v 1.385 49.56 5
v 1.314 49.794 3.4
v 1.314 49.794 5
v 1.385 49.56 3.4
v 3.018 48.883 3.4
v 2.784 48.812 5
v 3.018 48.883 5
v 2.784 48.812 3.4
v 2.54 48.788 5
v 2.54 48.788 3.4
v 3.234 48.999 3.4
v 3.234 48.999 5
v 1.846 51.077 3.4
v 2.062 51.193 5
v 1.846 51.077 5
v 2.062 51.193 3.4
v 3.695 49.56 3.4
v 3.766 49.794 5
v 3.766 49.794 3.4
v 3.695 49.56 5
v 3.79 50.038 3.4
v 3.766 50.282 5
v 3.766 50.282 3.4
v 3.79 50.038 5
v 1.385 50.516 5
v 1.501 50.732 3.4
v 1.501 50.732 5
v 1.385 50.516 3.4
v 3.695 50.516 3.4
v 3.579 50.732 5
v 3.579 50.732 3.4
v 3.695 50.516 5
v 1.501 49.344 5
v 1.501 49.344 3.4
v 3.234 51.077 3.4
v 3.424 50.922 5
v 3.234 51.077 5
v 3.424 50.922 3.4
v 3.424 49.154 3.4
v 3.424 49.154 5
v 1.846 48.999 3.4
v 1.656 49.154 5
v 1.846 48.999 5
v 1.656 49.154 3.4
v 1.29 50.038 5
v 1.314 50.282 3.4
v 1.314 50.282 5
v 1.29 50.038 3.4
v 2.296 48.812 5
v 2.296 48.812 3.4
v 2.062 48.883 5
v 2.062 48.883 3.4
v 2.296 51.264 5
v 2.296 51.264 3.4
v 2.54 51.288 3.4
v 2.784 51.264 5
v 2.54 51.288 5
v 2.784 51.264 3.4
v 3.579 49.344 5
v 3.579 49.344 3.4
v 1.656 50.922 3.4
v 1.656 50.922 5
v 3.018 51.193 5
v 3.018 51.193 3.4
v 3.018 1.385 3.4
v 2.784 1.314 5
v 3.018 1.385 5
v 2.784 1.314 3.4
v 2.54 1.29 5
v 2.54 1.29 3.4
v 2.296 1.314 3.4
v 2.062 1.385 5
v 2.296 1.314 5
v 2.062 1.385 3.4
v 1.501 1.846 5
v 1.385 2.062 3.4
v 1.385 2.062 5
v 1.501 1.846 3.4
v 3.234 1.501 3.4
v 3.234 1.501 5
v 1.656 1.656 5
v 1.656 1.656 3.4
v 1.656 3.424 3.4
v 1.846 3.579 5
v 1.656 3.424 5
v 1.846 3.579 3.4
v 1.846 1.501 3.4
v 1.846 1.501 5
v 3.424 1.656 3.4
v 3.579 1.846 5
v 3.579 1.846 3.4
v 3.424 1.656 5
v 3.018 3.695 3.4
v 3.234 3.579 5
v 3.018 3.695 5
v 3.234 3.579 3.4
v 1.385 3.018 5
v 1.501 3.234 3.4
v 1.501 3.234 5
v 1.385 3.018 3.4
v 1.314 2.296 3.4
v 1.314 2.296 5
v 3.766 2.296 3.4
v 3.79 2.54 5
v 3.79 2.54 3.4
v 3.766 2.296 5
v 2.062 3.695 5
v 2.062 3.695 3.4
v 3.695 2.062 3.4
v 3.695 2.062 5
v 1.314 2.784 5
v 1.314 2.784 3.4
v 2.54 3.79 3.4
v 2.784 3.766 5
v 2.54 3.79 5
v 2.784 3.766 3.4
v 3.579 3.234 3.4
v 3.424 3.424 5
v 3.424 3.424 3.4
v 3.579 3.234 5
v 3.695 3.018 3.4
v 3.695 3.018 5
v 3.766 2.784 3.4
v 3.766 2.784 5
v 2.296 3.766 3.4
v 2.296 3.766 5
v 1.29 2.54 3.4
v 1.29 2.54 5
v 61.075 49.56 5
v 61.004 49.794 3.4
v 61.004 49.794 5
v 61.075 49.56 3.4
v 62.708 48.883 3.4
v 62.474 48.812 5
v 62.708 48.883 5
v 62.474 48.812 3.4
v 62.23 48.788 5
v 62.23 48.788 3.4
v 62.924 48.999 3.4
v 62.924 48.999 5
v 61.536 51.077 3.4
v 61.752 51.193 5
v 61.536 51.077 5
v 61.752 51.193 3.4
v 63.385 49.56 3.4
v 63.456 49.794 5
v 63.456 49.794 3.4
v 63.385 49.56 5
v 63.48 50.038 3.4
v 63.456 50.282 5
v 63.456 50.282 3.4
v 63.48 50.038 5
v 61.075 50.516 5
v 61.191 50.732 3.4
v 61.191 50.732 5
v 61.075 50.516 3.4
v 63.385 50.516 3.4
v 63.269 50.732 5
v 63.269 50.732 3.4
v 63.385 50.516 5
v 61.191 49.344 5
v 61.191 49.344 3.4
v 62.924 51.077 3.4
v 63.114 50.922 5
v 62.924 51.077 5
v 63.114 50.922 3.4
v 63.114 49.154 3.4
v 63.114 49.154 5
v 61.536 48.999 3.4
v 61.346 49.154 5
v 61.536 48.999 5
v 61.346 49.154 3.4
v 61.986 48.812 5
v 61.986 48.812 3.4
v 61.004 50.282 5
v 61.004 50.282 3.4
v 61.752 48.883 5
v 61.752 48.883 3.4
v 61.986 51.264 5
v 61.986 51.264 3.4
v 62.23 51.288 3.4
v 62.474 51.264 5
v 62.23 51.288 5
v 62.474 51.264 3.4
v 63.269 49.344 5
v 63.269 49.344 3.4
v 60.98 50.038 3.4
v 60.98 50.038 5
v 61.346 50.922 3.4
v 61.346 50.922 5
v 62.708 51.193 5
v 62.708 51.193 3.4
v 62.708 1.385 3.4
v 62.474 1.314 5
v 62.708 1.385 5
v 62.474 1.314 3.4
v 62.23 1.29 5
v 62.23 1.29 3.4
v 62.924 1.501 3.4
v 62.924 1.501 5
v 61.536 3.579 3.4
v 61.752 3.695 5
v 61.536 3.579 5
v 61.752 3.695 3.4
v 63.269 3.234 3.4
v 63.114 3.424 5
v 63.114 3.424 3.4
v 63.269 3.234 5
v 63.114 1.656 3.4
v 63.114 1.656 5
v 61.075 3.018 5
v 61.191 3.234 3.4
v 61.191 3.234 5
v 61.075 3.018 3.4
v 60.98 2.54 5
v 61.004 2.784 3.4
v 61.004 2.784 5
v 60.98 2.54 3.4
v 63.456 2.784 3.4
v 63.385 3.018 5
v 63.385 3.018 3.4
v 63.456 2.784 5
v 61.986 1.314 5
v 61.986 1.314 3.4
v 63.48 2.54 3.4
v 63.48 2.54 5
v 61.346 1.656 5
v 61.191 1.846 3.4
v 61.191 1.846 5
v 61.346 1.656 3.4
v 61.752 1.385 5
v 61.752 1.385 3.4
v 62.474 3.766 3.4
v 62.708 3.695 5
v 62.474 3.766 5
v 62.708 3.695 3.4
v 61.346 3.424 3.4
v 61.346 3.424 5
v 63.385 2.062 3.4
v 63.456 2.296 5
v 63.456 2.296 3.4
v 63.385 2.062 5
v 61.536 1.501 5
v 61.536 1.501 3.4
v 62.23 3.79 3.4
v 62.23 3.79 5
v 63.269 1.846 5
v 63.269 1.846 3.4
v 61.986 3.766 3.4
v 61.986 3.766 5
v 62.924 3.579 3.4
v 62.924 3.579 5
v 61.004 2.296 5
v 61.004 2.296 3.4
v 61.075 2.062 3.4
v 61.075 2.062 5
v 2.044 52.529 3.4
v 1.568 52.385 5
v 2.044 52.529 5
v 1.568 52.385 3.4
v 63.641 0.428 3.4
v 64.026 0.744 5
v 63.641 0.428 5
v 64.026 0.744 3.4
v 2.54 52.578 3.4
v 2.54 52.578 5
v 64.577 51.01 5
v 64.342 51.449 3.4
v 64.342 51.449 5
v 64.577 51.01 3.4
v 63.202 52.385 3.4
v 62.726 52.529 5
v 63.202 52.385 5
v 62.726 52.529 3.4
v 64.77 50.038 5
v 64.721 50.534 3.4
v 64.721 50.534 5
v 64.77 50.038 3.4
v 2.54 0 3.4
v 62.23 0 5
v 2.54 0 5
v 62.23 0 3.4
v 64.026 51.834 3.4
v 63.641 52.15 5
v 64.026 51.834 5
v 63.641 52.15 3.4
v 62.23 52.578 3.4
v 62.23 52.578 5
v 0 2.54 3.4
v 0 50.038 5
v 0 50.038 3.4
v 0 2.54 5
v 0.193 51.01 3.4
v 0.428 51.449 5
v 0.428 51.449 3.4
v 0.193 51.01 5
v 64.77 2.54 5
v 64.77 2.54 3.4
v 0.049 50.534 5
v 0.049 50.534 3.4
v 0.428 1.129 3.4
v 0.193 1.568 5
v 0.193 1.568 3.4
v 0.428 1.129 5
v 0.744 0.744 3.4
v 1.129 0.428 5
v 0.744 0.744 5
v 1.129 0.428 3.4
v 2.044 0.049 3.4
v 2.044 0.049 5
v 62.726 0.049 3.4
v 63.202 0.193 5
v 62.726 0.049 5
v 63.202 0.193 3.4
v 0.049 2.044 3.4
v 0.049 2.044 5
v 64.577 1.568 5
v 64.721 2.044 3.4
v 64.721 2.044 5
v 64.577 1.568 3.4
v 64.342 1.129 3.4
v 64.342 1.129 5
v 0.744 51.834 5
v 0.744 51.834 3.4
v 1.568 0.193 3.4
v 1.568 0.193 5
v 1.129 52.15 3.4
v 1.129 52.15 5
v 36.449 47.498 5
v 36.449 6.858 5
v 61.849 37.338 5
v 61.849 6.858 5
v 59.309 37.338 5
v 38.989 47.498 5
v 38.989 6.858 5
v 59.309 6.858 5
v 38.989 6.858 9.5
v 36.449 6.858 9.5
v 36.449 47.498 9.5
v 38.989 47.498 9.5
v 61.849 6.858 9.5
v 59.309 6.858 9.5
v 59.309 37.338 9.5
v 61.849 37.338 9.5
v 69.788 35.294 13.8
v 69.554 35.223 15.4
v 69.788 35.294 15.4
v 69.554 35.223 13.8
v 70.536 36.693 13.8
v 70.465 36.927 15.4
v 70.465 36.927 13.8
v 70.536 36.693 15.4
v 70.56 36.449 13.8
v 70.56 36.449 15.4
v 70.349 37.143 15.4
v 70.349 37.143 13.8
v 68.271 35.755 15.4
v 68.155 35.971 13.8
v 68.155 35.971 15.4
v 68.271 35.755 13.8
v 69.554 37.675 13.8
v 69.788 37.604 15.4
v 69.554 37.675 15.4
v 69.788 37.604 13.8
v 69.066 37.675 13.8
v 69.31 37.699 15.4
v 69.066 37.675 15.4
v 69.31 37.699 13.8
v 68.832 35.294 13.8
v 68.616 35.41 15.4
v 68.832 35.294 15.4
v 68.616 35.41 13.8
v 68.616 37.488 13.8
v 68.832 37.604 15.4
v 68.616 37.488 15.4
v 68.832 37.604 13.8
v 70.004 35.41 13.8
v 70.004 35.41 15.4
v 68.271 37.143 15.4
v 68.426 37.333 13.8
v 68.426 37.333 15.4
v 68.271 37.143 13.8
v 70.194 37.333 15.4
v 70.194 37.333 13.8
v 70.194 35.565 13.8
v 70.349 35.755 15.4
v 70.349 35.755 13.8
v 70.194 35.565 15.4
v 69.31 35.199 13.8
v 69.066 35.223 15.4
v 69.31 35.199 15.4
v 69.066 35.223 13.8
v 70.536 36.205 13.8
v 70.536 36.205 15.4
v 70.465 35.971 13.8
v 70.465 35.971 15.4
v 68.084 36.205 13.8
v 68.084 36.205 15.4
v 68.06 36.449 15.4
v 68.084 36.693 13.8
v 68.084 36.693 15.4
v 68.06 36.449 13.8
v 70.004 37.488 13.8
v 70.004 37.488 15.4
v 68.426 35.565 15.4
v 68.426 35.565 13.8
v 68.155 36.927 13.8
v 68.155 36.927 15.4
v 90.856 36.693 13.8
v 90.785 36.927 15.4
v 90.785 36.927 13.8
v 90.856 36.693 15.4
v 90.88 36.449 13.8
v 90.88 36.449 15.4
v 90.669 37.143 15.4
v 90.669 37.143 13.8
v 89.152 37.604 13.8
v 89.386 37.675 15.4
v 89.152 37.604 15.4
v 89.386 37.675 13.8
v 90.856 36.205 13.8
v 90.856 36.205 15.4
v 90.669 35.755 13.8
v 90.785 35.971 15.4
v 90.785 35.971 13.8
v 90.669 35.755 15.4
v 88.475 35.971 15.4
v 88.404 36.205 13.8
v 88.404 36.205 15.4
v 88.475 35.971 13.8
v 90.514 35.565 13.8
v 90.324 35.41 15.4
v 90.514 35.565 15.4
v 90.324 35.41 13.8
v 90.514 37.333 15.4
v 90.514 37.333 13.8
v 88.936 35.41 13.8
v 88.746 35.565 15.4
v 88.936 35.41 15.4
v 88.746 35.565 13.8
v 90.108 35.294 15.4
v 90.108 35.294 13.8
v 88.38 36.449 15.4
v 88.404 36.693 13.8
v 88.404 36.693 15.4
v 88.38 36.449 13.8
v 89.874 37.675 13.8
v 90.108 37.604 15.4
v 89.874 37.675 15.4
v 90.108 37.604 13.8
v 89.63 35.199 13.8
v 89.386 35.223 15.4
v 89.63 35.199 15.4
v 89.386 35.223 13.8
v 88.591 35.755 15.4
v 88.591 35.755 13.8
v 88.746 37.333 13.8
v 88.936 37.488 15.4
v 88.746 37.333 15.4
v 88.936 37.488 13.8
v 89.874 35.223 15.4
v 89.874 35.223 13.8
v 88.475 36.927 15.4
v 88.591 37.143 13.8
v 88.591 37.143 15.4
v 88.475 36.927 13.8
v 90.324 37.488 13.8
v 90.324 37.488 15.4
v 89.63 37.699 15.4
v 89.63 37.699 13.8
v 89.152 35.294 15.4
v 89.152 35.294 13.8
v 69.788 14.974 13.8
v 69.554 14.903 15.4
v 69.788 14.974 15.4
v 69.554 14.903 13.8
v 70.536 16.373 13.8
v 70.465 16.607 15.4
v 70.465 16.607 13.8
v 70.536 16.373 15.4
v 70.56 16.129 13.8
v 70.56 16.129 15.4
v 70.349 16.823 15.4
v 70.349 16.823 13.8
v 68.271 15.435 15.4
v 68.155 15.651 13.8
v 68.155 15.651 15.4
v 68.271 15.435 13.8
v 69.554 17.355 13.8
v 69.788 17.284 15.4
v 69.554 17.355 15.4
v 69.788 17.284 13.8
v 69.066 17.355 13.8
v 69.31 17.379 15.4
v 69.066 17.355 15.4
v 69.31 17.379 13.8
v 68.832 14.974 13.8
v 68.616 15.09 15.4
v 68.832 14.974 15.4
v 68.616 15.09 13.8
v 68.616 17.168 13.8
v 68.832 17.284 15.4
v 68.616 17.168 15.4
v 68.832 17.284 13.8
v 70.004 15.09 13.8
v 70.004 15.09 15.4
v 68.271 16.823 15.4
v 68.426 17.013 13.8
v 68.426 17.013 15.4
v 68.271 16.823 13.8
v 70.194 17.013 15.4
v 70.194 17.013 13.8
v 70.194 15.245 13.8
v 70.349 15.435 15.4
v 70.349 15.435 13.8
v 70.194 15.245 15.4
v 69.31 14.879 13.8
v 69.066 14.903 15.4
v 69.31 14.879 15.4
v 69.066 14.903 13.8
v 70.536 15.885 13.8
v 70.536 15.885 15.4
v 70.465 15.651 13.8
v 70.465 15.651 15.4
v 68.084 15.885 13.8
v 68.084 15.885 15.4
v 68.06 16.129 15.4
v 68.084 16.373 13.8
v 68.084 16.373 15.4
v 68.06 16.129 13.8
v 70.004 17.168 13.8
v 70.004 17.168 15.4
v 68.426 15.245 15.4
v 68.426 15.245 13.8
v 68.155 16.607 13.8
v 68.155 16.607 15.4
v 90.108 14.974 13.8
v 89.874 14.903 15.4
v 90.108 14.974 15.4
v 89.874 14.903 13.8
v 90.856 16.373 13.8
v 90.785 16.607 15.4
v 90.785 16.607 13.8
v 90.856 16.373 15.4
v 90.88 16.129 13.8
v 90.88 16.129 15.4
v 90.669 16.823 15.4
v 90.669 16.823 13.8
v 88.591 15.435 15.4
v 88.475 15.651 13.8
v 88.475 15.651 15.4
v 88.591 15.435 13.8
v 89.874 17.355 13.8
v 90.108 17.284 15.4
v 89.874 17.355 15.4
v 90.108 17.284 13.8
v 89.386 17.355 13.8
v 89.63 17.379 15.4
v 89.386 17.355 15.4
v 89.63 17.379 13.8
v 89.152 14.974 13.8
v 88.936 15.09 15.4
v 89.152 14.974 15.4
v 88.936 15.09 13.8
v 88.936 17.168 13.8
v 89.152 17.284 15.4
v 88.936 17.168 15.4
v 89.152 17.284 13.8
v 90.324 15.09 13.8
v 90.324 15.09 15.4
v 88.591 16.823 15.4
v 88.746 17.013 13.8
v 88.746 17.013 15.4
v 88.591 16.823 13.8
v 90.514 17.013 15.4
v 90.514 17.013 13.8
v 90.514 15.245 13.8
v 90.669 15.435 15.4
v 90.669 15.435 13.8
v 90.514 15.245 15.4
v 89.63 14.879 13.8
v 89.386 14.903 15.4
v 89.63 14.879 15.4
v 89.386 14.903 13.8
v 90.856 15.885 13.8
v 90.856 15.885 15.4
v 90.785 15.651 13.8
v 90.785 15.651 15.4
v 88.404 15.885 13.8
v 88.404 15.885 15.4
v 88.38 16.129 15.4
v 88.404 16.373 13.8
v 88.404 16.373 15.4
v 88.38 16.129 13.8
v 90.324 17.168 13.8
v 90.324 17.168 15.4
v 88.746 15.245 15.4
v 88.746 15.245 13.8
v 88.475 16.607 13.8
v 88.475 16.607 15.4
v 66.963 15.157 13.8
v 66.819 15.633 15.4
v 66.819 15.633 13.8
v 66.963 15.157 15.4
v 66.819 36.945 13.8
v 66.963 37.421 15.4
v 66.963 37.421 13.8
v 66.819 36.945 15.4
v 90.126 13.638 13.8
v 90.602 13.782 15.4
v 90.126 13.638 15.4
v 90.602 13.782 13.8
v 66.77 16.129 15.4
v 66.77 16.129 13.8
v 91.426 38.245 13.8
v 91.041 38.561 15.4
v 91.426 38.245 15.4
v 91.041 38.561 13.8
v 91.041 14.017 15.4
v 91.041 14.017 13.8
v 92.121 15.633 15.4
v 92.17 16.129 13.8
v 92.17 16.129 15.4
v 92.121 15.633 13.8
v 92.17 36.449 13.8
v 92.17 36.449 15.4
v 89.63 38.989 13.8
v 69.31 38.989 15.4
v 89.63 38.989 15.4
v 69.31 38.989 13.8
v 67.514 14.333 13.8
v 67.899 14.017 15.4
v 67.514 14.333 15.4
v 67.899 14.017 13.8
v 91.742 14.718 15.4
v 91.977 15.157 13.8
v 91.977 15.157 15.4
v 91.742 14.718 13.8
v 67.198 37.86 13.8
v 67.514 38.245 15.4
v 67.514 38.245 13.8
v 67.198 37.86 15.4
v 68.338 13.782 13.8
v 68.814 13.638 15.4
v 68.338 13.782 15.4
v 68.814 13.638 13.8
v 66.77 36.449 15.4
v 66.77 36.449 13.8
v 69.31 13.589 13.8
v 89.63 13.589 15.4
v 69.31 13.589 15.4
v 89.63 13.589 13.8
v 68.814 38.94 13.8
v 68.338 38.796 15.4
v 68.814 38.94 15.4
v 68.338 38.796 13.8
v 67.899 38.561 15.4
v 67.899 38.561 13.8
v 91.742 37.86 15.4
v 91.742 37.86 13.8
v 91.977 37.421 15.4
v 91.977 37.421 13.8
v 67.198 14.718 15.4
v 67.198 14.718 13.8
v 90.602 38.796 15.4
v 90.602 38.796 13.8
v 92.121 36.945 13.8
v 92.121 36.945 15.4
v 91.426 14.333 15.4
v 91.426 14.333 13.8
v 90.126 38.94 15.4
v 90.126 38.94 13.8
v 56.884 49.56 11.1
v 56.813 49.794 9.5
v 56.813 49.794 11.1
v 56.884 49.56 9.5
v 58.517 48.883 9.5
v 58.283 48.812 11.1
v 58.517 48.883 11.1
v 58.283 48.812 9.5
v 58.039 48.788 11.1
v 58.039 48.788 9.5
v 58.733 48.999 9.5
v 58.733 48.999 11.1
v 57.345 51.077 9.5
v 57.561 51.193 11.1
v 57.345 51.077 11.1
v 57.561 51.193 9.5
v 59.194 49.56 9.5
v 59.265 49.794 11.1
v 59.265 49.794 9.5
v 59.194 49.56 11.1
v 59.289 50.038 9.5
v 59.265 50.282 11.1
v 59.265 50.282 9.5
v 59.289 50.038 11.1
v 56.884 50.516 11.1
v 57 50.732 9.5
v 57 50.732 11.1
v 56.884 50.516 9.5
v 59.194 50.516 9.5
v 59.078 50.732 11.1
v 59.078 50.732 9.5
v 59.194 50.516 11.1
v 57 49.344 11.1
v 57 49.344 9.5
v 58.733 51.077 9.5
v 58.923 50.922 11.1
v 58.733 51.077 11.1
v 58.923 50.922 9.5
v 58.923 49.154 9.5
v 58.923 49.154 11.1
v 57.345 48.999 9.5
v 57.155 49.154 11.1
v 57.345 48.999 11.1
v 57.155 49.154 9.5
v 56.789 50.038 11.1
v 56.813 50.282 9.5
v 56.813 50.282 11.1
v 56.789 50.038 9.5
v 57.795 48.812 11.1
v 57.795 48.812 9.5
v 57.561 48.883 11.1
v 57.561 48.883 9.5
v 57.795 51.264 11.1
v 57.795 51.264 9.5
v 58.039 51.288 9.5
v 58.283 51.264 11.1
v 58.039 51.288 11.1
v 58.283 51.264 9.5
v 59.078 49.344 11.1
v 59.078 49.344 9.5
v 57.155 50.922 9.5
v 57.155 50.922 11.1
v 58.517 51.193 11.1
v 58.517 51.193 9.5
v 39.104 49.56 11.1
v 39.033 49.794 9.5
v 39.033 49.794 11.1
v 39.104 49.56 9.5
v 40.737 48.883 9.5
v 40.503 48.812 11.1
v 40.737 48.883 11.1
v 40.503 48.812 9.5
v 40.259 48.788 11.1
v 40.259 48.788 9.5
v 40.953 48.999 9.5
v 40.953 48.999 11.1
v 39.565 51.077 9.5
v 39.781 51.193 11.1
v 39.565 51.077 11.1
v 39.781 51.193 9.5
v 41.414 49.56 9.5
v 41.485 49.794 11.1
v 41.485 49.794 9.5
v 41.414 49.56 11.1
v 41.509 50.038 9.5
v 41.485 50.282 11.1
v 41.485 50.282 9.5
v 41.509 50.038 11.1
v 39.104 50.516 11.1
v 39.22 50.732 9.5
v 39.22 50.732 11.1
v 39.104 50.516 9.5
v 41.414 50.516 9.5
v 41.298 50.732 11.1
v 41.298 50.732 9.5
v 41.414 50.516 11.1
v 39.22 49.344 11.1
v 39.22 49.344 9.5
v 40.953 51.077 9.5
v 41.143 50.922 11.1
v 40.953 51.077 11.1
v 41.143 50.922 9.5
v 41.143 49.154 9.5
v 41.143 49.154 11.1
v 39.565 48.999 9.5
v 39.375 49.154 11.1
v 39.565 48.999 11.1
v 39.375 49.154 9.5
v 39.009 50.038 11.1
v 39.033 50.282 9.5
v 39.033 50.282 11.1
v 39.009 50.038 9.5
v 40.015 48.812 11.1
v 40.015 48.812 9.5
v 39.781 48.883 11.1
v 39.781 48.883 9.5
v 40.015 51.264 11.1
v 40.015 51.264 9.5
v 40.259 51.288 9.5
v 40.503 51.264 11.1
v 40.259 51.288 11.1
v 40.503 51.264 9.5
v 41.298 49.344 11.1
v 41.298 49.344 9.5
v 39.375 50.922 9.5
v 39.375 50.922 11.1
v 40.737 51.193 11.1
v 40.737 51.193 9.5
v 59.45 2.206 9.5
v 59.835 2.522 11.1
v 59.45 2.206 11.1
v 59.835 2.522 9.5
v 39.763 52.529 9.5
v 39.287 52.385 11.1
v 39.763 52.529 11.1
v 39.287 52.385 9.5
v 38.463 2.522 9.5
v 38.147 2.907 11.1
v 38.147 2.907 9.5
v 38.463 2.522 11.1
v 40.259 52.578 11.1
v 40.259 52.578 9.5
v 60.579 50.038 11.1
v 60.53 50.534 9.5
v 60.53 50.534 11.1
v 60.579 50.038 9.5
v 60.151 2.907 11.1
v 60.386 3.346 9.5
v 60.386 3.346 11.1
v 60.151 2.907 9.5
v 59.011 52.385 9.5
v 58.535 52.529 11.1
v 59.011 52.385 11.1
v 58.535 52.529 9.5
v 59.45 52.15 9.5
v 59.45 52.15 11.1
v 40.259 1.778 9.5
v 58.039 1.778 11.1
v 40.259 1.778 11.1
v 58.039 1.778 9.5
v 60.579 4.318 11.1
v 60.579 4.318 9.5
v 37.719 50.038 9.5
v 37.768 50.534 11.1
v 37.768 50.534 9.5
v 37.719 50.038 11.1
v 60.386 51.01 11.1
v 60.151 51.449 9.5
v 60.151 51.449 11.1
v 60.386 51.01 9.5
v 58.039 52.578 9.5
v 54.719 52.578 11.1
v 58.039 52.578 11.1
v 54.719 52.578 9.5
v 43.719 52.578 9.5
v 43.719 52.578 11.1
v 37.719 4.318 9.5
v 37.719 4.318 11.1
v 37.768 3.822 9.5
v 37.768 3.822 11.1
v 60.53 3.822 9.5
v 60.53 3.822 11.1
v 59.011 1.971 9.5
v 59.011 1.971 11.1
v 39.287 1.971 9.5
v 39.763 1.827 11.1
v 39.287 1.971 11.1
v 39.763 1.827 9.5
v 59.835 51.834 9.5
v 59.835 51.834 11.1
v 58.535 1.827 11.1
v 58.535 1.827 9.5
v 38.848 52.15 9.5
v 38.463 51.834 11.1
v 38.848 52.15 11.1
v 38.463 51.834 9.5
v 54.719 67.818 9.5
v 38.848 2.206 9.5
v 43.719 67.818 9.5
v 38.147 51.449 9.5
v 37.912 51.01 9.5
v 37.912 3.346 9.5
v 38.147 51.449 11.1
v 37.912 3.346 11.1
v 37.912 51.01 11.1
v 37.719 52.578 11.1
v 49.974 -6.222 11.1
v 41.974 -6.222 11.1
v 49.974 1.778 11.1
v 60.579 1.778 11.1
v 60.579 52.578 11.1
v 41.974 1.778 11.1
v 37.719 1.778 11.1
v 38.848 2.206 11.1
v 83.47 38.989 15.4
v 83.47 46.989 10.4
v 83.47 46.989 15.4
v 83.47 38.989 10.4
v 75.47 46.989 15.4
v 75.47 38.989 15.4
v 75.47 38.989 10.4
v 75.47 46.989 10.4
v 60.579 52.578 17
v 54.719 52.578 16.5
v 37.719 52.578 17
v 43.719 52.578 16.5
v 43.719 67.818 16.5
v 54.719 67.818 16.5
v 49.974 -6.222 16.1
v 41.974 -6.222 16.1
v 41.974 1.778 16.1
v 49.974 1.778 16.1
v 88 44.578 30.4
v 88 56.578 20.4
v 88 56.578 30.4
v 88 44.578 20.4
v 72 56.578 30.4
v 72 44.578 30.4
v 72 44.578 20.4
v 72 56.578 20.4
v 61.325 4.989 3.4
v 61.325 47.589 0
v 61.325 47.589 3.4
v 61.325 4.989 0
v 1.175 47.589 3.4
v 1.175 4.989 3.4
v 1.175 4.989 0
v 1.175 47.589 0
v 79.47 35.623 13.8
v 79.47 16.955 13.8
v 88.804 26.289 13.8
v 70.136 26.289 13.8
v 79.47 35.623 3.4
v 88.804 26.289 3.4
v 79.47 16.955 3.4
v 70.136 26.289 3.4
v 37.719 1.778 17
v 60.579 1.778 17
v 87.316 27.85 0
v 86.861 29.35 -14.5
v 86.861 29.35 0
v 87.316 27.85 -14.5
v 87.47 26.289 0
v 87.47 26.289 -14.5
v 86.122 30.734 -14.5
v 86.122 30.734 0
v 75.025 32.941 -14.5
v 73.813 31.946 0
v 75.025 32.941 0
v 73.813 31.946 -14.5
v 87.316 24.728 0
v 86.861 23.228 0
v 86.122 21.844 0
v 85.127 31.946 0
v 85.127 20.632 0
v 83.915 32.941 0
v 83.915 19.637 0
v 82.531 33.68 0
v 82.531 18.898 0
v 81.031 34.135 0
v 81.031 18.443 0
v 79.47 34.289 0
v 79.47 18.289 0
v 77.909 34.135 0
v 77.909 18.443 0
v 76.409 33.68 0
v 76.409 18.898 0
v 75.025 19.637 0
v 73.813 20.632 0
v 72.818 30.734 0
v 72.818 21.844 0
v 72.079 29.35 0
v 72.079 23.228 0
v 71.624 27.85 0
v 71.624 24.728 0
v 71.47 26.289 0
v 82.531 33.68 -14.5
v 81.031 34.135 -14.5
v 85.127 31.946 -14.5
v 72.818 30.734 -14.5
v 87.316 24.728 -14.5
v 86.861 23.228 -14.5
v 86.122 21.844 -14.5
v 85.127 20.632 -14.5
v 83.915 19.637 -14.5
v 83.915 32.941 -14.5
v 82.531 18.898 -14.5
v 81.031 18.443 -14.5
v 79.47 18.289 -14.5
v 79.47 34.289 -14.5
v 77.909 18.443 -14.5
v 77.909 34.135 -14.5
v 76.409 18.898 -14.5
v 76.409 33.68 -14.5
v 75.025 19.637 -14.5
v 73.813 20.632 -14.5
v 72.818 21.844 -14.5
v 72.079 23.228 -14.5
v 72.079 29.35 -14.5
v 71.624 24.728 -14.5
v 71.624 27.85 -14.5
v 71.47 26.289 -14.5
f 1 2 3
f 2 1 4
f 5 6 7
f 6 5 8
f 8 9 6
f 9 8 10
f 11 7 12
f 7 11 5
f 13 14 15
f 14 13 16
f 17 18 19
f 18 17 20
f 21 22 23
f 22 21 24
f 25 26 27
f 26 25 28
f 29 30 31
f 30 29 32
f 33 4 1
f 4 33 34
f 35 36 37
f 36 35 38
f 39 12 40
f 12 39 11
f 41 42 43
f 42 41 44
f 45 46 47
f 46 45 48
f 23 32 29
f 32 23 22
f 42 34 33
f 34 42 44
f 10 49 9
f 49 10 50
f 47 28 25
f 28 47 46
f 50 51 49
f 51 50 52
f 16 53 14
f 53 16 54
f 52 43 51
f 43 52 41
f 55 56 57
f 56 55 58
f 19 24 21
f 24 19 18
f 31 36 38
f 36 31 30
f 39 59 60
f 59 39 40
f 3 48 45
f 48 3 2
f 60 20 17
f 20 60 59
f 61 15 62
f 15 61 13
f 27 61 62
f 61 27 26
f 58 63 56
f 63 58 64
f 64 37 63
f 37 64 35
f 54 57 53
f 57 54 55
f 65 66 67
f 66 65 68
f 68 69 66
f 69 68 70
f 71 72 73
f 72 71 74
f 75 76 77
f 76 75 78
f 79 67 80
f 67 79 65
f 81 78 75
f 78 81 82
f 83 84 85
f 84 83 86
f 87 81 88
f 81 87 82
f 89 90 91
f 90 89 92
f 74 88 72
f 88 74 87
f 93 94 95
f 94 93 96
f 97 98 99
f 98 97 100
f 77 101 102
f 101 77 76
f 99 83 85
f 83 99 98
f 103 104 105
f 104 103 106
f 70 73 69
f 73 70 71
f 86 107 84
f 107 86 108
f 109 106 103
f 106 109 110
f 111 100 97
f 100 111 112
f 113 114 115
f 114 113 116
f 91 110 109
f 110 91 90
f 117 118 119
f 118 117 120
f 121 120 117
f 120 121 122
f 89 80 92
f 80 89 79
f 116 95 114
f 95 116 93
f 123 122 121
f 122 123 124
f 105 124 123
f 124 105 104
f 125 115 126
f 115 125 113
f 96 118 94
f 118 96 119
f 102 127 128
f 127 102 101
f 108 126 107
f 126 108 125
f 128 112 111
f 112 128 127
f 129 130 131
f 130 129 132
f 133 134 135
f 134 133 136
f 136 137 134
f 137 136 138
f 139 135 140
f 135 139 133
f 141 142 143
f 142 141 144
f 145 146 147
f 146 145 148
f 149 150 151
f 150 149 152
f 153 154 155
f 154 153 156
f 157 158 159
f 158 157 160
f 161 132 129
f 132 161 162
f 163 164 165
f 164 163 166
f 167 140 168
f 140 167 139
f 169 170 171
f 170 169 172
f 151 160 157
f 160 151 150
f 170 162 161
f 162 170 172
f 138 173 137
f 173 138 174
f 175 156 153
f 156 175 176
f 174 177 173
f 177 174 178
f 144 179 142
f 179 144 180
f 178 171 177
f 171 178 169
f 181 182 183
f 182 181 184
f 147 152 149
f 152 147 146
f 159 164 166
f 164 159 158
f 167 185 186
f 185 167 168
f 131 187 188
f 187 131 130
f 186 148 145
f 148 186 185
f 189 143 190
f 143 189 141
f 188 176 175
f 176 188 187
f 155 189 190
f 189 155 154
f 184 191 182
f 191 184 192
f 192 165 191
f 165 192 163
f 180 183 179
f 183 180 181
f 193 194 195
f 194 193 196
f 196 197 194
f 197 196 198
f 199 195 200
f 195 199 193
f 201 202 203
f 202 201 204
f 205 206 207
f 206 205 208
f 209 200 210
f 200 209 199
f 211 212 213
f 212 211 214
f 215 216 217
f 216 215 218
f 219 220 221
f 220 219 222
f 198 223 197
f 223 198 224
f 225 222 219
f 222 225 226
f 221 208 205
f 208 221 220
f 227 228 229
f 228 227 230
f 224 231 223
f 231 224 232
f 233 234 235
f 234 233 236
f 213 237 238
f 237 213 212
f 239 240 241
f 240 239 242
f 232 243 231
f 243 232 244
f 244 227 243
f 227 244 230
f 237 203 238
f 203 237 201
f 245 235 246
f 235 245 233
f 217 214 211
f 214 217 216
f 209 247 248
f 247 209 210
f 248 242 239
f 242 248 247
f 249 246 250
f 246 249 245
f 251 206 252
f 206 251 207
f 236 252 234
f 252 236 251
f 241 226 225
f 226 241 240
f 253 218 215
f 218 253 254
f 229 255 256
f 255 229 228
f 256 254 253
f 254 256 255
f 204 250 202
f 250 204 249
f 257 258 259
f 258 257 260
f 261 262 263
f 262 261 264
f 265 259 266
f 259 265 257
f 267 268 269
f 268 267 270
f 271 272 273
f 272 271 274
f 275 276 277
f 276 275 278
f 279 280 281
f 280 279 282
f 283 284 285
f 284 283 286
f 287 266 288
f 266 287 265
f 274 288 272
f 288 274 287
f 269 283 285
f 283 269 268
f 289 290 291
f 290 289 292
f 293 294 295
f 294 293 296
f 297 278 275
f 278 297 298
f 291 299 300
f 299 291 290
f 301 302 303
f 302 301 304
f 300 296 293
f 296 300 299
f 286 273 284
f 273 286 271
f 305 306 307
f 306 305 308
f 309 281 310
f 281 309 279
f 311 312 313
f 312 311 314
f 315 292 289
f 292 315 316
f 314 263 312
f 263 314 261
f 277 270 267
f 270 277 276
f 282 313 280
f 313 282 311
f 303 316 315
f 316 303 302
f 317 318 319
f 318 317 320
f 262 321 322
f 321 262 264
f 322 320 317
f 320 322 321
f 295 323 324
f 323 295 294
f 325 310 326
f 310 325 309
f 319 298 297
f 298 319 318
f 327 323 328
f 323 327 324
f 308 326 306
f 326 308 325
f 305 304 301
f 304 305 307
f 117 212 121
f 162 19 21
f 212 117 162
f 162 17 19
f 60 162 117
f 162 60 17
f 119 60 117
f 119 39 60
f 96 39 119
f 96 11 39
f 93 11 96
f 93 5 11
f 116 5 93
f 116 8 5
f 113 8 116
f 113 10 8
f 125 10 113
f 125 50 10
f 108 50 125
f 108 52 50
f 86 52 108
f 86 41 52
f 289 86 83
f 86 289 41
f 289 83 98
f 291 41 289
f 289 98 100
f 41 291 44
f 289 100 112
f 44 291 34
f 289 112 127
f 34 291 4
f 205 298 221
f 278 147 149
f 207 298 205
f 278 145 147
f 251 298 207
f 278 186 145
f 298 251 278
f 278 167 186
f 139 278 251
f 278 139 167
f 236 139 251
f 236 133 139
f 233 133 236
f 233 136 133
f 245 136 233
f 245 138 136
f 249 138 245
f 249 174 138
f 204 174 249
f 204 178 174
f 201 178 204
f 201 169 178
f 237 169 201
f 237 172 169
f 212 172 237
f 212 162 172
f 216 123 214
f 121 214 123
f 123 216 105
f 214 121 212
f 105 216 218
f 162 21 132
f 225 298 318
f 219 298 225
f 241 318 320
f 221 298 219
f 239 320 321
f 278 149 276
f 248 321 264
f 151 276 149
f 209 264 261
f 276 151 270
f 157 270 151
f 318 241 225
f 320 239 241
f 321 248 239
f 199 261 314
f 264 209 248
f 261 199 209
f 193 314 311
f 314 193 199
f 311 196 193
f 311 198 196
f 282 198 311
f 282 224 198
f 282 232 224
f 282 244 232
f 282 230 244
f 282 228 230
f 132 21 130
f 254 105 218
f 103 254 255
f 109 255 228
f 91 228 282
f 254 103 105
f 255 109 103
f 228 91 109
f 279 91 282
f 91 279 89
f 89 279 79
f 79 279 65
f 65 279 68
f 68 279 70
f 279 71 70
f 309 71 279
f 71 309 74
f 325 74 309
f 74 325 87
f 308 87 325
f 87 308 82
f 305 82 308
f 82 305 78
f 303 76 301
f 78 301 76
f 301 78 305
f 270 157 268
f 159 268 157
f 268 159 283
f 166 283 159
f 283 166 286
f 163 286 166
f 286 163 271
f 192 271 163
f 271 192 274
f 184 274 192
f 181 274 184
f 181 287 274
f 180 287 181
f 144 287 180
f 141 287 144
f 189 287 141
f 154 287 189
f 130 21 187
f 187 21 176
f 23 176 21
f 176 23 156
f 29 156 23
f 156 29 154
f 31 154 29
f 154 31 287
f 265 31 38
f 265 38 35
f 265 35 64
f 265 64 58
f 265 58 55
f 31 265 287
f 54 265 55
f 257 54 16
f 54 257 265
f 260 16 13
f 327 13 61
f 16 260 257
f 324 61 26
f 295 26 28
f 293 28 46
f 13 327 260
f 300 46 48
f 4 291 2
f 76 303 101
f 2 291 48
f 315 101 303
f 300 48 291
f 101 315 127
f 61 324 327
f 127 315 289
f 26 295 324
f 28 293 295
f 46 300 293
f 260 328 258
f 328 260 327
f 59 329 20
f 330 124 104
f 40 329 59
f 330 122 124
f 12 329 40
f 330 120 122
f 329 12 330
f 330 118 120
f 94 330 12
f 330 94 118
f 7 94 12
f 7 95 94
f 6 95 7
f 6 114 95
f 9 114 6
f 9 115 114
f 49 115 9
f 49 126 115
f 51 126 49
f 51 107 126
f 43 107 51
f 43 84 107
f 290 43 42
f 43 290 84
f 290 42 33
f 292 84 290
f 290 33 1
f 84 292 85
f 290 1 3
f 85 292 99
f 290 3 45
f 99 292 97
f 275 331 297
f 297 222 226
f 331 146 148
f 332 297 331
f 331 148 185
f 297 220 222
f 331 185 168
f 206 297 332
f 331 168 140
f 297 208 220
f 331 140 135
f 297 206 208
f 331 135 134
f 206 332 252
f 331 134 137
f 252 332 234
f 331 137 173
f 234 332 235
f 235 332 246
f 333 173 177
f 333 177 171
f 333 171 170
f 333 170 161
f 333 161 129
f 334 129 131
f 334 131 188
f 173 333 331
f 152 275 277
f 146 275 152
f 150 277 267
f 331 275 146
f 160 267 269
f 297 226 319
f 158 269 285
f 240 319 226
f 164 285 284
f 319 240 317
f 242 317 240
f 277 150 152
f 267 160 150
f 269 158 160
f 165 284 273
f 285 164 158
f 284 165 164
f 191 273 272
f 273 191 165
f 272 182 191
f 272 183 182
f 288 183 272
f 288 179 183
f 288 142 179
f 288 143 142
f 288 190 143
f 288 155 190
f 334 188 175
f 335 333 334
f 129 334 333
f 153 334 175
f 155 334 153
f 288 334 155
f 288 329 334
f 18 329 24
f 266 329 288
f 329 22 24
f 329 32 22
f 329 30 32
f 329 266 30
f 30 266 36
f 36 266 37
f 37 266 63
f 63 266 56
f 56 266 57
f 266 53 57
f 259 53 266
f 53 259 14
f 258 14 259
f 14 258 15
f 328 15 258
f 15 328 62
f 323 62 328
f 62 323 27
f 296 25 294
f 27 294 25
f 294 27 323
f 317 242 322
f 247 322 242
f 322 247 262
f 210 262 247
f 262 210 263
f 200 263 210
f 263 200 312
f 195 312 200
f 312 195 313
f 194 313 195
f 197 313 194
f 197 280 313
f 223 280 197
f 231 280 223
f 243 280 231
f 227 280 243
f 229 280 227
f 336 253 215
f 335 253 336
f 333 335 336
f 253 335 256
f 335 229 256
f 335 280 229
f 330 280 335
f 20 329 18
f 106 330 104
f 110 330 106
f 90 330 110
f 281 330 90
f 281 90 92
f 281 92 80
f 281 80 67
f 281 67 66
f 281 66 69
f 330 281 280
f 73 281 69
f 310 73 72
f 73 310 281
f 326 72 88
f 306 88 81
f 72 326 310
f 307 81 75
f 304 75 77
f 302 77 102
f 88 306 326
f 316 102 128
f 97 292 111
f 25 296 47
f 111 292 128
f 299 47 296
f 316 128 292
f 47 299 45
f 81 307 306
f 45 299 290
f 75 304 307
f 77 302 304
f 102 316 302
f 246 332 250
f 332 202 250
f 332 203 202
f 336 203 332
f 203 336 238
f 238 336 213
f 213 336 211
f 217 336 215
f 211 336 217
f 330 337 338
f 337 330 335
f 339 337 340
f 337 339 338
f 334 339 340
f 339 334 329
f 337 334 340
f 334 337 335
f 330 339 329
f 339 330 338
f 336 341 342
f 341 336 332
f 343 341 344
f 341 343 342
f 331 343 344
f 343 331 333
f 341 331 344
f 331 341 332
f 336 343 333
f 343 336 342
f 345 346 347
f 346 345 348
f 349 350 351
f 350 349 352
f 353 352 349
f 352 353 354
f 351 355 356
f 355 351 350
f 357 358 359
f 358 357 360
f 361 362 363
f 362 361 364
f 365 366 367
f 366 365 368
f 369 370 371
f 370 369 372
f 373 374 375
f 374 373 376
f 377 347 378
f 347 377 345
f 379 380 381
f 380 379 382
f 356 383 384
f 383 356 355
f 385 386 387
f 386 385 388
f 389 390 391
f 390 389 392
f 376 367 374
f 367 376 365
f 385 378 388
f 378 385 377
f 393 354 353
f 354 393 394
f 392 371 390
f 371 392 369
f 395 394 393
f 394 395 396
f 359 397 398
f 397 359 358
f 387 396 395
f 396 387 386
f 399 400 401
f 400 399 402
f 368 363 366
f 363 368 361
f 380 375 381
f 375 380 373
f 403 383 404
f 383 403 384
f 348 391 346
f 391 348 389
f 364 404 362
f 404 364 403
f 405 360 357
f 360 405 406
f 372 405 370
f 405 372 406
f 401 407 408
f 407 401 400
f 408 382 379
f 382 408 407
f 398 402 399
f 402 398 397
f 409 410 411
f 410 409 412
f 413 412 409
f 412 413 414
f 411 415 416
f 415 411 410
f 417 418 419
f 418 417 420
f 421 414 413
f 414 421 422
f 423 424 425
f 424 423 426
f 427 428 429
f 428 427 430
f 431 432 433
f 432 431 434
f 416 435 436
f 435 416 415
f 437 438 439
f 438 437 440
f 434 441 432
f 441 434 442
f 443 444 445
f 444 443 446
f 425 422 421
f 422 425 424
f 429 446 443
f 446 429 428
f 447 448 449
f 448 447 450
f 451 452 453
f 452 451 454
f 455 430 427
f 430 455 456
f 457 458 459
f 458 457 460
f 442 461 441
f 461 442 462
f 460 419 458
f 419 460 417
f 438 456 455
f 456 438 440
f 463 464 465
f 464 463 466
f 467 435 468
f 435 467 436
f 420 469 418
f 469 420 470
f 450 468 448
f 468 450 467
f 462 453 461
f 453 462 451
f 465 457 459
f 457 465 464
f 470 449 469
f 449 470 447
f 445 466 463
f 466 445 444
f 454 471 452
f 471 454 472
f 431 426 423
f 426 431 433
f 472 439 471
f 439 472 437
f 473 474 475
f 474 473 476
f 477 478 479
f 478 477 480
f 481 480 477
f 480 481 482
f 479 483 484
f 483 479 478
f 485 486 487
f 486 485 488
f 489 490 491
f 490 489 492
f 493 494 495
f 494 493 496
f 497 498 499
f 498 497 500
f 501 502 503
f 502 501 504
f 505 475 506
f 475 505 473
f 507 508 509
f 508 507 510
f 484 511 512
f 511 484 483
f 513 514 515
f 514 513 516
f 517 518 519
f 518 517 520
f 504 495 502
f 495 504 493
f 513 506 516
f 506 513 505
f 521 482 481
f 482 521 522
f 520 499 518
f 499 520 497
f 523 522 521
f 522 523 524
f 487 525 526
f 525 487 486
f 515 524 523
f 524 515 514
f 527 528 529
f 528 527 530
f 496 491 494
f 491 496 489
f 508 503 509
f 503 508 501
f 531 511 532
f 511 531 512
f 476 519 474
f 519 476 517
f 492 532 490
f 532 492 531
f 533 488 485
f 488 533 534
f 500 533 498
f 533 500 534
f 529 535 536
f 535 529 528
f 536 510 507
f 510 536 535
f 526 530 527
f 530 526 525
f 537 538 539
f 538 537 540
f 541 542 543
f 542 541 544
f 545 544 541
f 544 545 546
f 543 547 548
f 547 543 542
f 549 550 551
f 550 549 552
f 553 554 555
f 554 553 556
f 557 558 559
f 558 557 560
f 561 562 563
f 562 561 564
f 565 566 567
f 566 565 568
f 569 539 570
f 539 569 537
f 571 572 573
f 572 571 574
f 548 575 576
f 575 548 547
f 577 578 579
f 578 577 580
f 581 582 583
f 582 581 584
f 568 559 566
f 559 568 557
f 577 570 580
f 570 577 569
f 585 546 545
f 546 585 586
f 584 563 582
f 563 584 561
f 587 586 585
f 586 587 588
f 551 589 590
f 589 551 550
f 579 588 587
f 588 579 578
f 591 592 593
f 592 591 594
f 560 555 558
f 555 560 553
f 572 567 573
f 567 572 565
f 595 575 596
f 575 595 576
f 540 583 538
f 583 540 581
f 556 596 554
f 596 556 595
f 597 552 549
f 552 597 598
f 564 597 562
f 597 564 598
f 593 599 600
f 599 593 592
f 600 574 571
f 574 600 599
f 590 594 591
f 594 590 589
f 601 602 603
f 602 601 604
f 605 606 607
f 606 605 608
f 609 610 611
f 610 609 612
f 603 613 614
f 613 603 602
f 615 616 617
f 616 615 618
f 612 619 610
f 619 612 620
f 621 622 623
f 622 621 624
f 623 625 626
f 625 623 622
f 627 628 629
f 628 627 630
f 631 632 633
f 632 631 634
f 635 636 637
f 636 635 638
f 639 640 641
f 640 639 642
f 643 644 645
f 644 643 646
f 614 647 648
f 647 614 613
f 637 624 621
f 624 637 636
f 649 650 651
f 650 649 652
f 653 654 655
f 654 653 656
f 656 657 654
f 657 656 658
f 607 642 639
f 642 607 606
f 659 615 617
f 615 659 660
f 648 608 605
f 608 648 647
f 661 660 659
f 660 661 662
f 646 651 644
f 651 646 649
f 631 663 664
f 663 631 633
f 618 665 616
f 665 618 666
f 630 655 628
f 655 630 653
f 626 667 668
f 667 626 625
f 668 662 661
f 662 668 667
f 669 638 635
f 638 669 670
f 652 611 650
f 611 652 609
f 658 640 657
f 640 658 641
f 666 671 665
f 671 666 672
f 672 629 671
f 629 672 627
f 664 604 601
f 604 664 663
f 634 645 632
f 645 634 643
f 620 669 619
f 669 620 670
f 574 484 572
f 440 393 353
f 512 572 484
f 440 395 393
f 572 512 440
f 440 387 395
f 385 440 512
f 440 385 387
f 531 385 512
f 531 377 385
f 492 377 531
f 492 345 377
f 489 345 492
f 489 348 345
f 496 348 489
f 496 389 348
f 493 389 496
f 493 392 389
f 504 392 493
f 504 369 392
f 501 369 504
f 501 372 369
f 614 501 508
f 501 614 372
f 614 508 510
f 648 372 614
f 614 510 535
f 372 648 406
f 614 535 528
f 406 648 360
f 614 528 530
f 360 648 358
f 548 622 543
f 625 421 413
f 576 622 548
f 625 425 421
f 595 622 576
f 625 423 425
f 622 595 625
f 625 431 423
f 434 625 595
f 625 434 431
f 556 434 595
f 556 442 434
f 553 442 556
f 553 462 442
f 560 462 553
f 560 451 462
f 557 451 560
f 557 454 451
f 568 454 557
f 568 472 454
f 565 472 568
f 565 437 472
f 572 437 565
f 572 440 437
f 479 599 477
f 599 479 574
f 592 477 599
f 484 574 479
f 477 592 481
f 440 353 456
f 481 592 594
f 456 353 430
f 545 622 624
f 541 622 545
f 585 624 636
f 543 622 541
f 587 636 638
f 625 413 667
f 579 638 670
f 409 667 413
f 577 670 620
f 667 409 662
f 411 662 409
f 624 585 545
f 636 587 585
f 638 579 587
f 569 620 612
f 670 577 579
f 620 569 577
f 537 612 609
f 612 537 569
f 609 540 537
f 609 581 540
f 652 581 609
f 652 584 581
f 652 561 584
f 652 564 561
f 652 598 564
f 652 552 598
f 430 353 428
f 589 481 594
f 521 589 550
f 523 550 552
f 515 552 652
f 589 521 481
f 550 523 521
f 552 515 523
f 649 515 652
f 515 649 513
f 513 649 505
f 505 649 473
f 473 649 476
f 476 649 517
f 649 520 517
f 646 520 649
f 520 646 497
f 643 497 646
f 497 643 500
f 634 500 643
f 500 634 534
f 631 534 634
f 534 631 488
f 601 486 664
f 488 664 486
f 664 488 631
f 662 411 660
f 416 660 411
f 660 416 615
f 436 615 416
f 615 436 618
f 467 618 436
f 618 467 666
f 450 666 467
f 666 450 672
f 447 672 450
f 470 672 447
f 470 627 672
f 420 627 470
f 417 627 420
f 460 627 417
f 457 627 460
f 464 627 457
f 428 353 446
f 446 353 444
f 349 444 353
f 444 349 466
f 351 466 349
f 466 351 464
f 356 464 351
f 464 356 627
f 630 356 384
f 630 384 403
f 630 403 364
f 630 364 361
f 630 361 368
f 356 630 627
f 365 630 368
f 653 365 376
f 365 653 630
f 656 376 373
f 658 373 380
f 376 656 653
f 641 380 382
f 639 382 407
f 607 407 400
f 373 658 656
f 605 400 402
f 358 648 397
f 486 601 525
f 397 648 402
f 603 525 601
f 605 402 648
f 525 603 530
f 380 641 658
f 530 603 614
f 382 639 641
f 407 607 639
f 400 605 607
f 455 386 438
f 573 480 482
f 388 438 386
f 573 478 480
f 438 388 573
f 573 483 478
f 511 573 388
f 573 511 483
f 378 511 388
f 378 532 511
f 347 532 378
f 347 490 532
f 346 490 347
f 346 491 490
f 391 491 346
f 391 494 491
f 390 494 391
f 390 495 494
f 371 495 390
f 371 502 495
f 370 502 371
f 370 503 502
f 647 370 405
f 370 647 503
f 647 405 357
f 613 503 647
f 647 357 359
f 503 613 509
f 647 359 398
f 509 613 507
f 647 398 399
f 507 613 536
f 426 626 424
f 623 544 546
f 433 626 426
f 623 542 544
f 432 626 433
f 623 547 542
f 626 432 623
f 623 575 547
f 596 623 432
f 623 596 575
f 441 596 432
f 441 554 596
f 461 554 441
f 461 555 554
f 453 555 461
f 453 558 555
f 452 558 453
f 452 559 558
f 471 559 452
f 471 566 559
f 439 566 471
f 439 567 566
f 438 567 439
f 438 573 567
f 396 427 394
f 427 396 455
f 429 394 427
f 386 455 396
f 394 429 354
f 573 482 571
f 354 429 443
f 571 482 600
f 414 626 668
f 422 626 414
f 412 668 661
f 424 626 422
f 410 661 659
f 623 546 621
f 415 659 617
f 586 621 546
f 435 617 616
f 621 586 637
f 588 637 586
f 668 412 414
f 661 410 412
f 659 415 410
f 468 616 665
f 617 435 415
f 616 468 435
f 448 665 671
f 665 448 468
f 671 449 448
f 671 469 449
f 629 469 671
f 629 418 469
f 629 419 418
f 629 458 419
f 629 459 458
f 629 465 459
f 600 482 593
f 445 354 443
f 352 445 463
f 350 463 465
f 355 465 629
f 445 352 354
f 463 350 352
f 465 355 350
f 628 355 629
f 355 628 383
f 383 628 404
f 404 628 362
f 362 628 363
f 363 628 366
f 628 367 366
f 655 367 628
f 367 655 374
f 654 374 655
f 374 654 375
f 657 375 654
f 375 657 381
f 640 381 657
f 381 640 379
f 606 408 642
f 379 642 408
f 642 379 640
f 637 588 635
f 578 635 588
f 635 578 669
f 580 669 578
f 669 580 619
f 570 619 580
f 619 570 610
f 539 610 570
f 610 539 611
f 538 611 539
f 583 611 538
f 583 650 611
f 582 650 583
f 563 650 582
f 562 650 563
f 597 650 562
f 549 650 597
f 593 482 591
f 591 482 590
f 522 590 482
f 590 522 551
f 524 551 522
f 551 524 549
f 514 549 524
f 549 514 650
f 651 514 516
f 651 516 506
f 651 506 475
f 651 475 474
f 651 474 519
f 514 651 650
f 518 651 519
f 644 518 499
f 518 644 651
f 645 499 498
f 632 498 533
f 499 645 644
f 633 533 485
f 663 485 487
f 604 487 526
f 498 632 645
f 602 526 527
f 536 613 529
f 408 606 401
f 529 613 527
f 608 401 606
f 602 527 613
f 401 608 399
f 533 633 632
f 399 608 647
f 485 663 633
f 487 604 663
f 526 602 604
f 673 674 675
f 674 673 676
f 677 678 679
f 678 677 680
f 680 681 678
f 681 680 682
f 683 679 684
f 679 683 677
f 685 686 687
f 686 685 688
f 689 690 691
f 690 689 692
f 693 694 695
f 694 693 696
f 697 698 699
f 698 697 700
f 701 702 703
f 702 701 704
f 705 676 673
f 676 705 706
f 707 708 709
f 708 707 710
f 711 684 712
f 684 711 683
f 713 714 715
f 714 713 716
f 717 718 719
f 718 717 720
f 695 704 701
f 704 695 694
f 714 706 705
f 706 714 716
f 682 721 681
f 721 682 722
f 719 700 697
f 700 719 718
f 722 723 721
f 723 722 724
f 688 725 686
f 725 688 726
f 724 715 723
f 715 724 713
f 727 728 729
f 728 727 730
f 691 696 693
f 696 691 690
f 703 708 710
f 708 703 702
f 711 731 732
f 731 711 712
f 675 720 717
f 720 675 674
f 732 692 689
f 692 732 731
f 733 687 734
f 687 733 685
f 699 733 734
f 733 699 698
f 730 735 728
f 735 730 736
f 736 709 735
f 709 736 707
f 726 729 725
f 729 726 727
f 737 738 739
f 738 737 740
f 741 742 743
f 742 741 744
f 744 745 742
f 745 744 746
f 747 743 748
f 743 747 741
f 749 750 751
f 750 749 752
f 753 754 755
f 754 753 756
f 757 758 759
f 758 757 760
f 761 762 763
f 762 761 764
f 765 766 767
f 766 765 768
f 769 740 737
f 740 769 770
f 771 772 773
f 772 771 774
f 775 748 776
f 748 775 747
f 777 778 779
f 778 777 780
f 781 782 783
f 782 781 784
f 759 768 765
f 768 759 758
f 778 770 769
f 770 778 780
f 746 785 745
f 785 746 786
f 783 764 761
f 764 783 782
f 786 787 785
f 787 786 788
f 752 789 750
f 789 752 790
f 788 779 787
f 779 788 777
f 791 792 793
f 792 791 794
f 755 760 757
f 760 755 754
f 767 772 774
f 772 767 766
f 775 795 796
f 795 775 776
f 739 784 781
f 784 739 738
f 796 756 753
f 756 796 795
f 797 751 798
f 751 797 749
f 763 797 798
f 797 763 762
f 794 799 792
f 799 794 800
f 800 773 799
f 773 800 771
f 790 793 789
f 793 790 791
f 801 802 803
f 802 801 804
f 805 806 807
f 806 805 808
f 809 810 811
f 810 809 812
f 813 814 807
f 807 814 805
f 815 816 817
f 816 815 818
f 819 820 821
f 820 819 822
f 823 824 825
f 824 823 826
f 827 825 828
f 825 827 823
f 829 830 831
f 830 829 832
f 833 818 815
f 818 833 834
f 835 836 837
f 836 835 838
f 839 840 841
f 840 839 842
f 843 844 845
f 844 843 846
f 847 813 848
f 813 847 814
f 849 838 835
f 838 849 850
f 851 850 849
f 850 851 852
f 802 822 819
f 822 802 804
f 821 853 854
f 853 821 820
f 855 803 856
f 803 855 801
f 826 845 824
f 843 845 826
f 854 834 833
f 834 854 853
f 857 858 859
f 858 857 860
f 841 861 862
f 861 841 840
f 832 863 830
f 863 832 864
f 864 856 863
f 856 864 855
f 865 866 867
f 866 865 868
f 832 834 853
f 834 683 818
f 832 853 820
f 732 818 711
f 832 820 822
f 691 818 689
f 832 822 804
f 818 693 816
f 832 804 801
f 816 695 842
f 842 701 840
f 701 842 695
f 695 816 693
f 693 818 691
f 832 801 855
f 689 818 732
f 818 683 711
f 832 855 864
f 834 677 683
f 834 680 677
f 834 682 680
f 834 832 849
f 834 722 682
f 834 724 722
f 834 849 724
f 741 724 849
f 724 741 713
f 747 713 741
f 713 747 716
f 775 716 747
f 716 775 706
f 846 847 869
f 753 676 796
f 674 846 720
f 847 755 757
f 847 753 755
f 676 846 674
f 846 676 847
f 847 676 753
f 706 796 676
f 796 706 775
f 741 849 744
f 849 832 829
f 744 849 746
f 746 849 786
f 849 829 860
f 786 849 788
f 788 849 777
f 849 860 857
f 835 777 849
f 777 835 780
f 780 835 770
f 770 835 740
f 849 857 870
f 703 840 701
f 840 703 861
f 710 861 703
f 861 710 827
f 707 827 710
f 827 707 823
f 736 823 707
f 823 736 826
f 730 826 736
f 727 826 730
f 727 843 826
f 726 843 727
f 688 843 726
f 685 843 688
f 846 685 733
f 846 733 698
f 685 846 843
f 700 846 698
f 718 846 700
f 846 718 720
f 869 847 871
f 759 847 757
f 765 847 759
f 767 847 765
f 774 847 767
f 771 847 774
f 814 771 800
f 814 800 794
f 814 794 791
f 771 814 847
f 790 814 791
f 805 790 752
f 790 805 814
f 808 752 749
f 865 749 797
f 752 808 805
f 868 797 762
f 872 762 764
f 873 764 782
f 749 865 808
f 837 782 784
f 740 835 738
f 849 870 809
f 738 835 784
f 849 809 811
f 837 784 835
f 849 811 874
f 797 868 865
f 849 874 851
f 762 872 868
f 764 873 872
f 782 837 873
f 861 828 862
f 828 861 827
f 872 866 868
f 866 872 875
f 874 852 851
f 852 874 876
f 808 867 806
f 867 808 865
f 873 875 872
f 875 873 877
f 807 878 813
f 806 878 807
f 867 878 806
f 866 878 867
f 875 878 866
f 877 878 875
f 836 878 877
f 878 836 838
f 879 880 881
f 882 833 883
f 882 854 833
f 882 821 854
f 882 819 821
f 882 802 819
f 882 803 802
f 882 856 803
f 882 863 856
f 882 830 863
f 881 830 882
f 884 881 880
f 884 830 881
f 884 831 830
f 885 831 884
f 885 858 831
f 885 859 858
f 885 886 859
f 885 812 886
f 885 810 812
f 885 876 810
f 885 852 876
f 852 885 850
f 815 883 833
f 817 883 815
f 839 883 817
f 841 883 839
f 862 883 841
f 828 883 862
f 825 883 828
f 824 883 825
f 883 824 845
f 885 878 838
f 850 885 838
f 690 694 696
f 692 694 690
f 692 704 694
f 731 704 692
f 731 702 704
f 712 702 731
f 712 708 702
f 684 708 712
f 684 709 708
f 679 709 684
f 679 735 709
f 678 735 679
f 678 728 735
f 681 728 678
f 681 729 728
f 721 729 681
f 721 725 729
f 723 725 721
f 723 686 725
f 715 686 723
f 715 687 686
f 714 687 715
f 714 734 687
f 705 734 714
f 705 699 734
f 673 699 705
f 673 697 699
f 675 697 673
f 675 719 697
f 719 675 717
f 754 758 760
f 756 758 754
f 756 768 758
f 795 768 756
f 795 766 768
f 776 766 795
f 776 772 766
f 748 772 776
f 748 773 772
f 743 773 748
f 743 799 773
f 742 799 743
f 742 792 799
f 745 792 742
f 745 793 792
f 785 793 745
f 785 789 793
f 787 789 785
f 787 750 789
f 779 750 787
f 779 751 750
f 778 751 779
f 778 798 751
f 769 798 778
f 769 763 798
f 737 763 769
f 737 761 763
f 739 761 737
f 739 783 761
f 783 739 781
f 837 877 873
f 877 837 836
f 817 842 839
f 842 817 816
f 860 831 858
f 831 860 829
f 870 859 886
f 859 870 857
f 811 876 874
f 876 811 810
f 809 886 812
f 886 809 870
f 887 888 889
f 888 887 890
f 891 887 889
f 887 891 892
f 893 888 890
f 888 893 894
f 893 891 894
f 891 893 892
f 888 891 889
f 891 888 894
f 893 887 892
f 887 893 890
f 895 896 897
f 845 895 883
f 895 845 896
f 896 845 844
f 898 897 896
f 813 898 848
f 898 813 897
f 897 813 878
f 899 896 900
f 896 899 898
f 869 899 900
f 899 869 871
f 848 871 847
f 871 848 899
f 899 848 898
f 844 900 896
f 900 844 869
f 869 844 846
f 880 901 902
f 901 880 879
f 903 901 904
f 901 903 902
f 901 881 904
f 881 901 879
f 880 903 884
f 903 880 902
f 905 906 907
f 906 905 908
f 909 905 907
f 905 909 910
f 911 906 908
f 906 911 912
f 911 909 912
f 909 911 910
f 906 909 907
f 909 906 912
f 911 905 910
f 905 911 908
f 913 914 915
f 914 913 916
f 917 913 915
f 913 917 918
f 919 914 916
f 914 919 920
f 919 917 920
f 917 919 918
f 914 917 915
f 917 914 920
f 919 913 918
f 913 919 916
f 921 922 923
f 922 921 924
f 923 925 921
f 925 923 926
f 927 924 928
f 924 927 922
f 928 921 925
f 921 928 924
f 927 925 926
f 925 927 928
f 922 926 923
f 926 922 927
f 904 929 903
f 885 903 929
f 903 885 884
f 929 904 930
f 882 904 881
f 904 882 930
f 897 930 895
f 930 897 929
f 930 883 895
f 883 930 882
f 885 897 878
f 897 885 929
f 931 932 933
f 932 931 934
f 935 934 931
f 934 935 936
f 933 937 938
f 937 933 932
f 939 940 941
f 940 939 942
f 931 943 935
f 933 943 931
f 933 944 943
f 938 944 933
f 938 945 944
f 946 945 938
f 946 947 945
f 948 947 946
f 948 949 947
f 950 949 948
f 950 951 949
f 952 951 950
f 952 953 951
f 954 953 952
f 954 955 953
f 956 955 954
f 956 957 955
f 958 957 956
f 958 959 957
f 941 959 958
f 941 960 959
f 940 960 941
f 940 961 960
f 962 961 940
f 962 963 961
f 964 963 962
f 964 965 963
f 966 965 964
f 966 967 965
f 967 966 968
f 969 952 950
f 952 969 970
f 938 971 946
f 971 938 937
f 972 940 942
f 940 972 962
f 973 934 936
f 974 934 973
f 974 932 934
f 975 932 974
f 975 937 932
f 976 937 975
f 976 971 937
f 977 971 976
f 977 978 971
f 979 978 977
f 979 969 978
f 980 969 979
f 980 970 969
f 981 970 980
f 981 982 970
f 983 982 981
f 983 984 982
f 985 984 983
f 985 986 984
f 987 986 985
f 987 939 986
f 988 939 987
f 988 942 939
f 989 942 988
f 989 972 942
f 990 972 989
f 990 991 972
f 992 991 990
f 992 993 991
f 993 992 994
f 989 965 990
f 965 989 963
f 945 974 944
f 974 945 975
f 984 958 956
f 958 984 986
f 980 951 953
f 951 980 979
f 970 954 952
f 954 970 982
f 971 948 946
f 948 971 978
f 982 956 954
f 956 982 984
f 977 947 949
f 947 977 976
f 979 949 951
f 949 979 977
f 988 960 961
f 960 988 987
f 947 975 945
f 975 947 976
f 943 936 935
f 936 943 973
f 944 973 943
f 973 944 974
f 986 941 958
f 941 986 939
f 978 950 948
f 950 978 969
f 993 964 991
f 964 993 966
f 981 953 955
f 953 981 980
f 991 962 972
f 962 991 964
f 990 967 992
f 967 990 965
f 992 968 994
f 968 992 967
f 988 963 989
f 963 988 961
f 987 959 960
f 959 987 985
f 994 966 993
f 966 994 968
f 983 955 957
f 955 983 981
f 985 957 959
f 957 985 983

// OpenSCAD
// file: dimensions.scad
// XY facts extracted from Adafruit Eagle CAD. See vendor-dimensions.json.
// Board thickness and component heights are deliberately NOT inferred.
screen_xy = [52.578, 64.77];
screen_holes = [[2.54, 2.54, 2.5], [50.038, 2.54, 2.5], [2.54, 62.23, 2.5], [50.038, 62.23, 2.5]];
feather_xy = [50.8, 22.86];
feather_holes = [[2.54, 20.32, 2.5], [2.54, 2.54, 2.5]];
encoder_xy = [25.4, 25.4];
encoder_holes = [[2.54, 22.86, 2.5], [22.86, 22.86, 2.5], [2.54, 2.54, 2.5], [22.86, 2.54, 2.5]];
// main file
// blip V2 component packing study, NOT a print-ready enclosure.
// XY from vendor Eagle CAD. Amber volumes are provisional connector/bend space.
include <dimensions.scad>
layout = "stacked"; // [stacked,remote-flat,remote-edge]
qt_source="feather"; // [feather,screen]
view = "assembly"; // [assembly,exploded,collision,envelope]
$fn=32;
// Z placements and cable envelopes are provisional; published overall heights
// constrain the boxes but do not determine the assembled component stack.
pcb_t=1.6;
lcd_depth=3.4;
header_height=4.5; // Provisional split of Adafruit's 9.5 mm overall screen height.
component_height=5.9; // With 1.6 mm PCB, matches published Feather 7.5 mm.
encoder_back_depth=12;
knob_d=16; // 450-BA761 drawing linked from Adafruit #377.
knob_h=14.5;
board_gap=2;
qt_overhang=8; // Plug and gentle wire bend, not just bare socket.
usb_overhang=15.24; // User's current plug clearance; proxy, not a bend model.
wire_gap=3;
// Screen lies landscape; x increases right, y down, z behind display face.
sw=screen_xy[1]; sh=screen_xy[0];
screen_z=lcd_depth;
encoder_x=sw+board_gap;
encoder_y=(sh-encoder_xy[1])/2;
// Existing board components and header bodies still occupy space after unplugging.
screen_back=screen_z+pcb_t+header_height;
remote_z=max(screen_back,lcd_depth+encoder_back_depth)+wire_gap;
feather_z=layout=="stacked" ? screen_back : remote_z;
feather_x=layout=="stacked" ? 37.719 : (sw-feather_xy[0])/2;
feather_y=layout=="stacked" ? 0 : (sh-feather_xy[1])/2;
exploded=view=="exploded" ? 20 : 0;

module board(size,holes) {
 difference() {
  linear_extrude(pcb_t) hull() for(x=[2.54,size[0]-2.54],y=[2.54,size[1]-2.54]) translate([x,y]) circle(r=2.54);
  for(h=holes) translate([h[0],h[1],-0.1]) cylinder(h=pcb_t+0.2,d=h[2]);
 }
}
module screen_pose() { translate([0,sh,screen_z]) rotate([0,0,-90]) children(); }
module screen_pcb() { screen_pose() board(screen_xy,screen_holes); }
module screen_headers() {
 // Feather header row XY comes from MS2 footprint at [0,37.719], R0.
 screen_pose() {
  translate([5.08,37.719-1.27,pcb_t]) cube([40.64,2.54,header_height]);
  translate([15.24,37.719+21.59,pcb_t]) cube([30.48,2.54,header_height]);
 }
}
module screen_lcd() {
 // 60.15 x 42.6 package outline from TFT footprint layer 51.
 translate([1.175,(sh-42.6)/2,0]) cube([60.15,42.6,lcd_depth]);
}
module screen_qt_space() {
 // CONN1 [49.53,49.149] becomes [49.149,3.048] in landscape.
 if(qt_source=="screen") translate([49.149-4,-qt_overhang,screen_z+pcb_t]) cube([8,qt_overhang+5,5]);
}
module encoder_pcb() {translate([encoder_x,encoder_y,lcd_depth+encoder_back_depth-pcb_t]) board(encoder_xy,encoder_holes);}
module encoder_body() {
 translate([encoder_x+12.7,encoder_y+12.7,lcd_depth]) rotate([0,0,45])
  translate([-6.6,-6.6,0]) cube([13.2,13.2,encoder_back_depth-pcb_t]);
}
module encoder_qt_space() {
 // Choose the lower port by rotating breakout 90 degrees in its front plane.
 translate([encoder_x+8.7,encoder_y+25.4,lcd_depth+encoder_back_depth-5]) cube([8,qt_overhang,5]);
}
module feather_pose() {
 if(layout=="stacked") translate([37.719,sh,feather_z+exploded]) rotate([0,0,-90]) children();
 else if(layout=="remote-edge") translate([6,sh-8,remote_z+exploded]) rotate([90,0,0]) children();
 else translate([feather_x+feather_xy[0],feather_y+feather_xy[1],feather_z+exploded]) rotate([0,0,180]) children();
}
module feather_pcb() {feather_pose() board(feather_xy,feather_holes);}
module feather_components() {feather_pose() translate([0,0,pcb_t]) cube([feather_xy[0],feather_xy[1],component_height]);}
module feather_qt_space() {
 // CONN1 at [47.752,8.255], facing the far end of the Feather.
 if(qt_source=="feather") feather_pose()
  translate([feather_xy[0]-5,8.255-4,pcb_t]) cube([5+qt_overhang,8,5]);
}
module feather_usb_space() {feather_pose() translate([-usb_overhang,6,0]) cube([usb_overhang,11,7]);}
// Generic case-mounted socket body; no chosen product or screw pattern yet.
module panel_socket_space() {translate([72,sh-8,remote_z+2]) cube([16,12,10]);}
module hardware() {
 color("#237f69") screen_pcb();
 color("#111b26") screen_lcd();
 color("#303039") screen_headers();
 color("#8360b8") encoder_pcb();
 color("silver") encoder_body();
 color("#2485bd") feather_pcb();
 color([0.15,0.42,0.7,0.45]) feather_components();
 color("#394754") translate([encoder_x+12.7,encoder_y+12.7,-knob_h]) cylinder(h=knob_h,d=knob_d);
 color([1,0.55,0.12,0.4]) {screen_qt_space();encoder_qt_space();feather_usb_space();feather_qt_space();panel_socket_space();}
}
module collision() {
 // Test separate rigid/clearance volumes, excluding intended mounts/contact.
 intersection() {union(){screen_pcb();screen_headers();screen_lcd();screen_qt_space();encoder_pcb();encoder_body();encoder_qt_space();} union(){feather_pcb();feather_components();feather_usb_space();feather_qt_space();}}
 intersection() {union(){screen_pcb();screen_headers();screen_lcd();screen_qt_space();} union(){encoder_pcb();encoder_body();encoder_qt_space();}}
 intersection() {panel_socket_space();union(){screen_pcb();screen_headers();screen_qt_space();encoder_pcb();encoder_body();encoder_qt_space();feather_pcb();feather_components();feather_usb_space();feather_qt_space();}}
}
if(view=="envelope") {screen_pcb();screen_lcd();screen_headers();screen_qt_space();encoder_pcb();encoder_body();encoder_qt_space();feather_pcb();feather_components();feather_usb_space();feather_qt_space();panel_socket_space();}
else if(view=="collision") collision();
else {hardware();color("red") collision();}
